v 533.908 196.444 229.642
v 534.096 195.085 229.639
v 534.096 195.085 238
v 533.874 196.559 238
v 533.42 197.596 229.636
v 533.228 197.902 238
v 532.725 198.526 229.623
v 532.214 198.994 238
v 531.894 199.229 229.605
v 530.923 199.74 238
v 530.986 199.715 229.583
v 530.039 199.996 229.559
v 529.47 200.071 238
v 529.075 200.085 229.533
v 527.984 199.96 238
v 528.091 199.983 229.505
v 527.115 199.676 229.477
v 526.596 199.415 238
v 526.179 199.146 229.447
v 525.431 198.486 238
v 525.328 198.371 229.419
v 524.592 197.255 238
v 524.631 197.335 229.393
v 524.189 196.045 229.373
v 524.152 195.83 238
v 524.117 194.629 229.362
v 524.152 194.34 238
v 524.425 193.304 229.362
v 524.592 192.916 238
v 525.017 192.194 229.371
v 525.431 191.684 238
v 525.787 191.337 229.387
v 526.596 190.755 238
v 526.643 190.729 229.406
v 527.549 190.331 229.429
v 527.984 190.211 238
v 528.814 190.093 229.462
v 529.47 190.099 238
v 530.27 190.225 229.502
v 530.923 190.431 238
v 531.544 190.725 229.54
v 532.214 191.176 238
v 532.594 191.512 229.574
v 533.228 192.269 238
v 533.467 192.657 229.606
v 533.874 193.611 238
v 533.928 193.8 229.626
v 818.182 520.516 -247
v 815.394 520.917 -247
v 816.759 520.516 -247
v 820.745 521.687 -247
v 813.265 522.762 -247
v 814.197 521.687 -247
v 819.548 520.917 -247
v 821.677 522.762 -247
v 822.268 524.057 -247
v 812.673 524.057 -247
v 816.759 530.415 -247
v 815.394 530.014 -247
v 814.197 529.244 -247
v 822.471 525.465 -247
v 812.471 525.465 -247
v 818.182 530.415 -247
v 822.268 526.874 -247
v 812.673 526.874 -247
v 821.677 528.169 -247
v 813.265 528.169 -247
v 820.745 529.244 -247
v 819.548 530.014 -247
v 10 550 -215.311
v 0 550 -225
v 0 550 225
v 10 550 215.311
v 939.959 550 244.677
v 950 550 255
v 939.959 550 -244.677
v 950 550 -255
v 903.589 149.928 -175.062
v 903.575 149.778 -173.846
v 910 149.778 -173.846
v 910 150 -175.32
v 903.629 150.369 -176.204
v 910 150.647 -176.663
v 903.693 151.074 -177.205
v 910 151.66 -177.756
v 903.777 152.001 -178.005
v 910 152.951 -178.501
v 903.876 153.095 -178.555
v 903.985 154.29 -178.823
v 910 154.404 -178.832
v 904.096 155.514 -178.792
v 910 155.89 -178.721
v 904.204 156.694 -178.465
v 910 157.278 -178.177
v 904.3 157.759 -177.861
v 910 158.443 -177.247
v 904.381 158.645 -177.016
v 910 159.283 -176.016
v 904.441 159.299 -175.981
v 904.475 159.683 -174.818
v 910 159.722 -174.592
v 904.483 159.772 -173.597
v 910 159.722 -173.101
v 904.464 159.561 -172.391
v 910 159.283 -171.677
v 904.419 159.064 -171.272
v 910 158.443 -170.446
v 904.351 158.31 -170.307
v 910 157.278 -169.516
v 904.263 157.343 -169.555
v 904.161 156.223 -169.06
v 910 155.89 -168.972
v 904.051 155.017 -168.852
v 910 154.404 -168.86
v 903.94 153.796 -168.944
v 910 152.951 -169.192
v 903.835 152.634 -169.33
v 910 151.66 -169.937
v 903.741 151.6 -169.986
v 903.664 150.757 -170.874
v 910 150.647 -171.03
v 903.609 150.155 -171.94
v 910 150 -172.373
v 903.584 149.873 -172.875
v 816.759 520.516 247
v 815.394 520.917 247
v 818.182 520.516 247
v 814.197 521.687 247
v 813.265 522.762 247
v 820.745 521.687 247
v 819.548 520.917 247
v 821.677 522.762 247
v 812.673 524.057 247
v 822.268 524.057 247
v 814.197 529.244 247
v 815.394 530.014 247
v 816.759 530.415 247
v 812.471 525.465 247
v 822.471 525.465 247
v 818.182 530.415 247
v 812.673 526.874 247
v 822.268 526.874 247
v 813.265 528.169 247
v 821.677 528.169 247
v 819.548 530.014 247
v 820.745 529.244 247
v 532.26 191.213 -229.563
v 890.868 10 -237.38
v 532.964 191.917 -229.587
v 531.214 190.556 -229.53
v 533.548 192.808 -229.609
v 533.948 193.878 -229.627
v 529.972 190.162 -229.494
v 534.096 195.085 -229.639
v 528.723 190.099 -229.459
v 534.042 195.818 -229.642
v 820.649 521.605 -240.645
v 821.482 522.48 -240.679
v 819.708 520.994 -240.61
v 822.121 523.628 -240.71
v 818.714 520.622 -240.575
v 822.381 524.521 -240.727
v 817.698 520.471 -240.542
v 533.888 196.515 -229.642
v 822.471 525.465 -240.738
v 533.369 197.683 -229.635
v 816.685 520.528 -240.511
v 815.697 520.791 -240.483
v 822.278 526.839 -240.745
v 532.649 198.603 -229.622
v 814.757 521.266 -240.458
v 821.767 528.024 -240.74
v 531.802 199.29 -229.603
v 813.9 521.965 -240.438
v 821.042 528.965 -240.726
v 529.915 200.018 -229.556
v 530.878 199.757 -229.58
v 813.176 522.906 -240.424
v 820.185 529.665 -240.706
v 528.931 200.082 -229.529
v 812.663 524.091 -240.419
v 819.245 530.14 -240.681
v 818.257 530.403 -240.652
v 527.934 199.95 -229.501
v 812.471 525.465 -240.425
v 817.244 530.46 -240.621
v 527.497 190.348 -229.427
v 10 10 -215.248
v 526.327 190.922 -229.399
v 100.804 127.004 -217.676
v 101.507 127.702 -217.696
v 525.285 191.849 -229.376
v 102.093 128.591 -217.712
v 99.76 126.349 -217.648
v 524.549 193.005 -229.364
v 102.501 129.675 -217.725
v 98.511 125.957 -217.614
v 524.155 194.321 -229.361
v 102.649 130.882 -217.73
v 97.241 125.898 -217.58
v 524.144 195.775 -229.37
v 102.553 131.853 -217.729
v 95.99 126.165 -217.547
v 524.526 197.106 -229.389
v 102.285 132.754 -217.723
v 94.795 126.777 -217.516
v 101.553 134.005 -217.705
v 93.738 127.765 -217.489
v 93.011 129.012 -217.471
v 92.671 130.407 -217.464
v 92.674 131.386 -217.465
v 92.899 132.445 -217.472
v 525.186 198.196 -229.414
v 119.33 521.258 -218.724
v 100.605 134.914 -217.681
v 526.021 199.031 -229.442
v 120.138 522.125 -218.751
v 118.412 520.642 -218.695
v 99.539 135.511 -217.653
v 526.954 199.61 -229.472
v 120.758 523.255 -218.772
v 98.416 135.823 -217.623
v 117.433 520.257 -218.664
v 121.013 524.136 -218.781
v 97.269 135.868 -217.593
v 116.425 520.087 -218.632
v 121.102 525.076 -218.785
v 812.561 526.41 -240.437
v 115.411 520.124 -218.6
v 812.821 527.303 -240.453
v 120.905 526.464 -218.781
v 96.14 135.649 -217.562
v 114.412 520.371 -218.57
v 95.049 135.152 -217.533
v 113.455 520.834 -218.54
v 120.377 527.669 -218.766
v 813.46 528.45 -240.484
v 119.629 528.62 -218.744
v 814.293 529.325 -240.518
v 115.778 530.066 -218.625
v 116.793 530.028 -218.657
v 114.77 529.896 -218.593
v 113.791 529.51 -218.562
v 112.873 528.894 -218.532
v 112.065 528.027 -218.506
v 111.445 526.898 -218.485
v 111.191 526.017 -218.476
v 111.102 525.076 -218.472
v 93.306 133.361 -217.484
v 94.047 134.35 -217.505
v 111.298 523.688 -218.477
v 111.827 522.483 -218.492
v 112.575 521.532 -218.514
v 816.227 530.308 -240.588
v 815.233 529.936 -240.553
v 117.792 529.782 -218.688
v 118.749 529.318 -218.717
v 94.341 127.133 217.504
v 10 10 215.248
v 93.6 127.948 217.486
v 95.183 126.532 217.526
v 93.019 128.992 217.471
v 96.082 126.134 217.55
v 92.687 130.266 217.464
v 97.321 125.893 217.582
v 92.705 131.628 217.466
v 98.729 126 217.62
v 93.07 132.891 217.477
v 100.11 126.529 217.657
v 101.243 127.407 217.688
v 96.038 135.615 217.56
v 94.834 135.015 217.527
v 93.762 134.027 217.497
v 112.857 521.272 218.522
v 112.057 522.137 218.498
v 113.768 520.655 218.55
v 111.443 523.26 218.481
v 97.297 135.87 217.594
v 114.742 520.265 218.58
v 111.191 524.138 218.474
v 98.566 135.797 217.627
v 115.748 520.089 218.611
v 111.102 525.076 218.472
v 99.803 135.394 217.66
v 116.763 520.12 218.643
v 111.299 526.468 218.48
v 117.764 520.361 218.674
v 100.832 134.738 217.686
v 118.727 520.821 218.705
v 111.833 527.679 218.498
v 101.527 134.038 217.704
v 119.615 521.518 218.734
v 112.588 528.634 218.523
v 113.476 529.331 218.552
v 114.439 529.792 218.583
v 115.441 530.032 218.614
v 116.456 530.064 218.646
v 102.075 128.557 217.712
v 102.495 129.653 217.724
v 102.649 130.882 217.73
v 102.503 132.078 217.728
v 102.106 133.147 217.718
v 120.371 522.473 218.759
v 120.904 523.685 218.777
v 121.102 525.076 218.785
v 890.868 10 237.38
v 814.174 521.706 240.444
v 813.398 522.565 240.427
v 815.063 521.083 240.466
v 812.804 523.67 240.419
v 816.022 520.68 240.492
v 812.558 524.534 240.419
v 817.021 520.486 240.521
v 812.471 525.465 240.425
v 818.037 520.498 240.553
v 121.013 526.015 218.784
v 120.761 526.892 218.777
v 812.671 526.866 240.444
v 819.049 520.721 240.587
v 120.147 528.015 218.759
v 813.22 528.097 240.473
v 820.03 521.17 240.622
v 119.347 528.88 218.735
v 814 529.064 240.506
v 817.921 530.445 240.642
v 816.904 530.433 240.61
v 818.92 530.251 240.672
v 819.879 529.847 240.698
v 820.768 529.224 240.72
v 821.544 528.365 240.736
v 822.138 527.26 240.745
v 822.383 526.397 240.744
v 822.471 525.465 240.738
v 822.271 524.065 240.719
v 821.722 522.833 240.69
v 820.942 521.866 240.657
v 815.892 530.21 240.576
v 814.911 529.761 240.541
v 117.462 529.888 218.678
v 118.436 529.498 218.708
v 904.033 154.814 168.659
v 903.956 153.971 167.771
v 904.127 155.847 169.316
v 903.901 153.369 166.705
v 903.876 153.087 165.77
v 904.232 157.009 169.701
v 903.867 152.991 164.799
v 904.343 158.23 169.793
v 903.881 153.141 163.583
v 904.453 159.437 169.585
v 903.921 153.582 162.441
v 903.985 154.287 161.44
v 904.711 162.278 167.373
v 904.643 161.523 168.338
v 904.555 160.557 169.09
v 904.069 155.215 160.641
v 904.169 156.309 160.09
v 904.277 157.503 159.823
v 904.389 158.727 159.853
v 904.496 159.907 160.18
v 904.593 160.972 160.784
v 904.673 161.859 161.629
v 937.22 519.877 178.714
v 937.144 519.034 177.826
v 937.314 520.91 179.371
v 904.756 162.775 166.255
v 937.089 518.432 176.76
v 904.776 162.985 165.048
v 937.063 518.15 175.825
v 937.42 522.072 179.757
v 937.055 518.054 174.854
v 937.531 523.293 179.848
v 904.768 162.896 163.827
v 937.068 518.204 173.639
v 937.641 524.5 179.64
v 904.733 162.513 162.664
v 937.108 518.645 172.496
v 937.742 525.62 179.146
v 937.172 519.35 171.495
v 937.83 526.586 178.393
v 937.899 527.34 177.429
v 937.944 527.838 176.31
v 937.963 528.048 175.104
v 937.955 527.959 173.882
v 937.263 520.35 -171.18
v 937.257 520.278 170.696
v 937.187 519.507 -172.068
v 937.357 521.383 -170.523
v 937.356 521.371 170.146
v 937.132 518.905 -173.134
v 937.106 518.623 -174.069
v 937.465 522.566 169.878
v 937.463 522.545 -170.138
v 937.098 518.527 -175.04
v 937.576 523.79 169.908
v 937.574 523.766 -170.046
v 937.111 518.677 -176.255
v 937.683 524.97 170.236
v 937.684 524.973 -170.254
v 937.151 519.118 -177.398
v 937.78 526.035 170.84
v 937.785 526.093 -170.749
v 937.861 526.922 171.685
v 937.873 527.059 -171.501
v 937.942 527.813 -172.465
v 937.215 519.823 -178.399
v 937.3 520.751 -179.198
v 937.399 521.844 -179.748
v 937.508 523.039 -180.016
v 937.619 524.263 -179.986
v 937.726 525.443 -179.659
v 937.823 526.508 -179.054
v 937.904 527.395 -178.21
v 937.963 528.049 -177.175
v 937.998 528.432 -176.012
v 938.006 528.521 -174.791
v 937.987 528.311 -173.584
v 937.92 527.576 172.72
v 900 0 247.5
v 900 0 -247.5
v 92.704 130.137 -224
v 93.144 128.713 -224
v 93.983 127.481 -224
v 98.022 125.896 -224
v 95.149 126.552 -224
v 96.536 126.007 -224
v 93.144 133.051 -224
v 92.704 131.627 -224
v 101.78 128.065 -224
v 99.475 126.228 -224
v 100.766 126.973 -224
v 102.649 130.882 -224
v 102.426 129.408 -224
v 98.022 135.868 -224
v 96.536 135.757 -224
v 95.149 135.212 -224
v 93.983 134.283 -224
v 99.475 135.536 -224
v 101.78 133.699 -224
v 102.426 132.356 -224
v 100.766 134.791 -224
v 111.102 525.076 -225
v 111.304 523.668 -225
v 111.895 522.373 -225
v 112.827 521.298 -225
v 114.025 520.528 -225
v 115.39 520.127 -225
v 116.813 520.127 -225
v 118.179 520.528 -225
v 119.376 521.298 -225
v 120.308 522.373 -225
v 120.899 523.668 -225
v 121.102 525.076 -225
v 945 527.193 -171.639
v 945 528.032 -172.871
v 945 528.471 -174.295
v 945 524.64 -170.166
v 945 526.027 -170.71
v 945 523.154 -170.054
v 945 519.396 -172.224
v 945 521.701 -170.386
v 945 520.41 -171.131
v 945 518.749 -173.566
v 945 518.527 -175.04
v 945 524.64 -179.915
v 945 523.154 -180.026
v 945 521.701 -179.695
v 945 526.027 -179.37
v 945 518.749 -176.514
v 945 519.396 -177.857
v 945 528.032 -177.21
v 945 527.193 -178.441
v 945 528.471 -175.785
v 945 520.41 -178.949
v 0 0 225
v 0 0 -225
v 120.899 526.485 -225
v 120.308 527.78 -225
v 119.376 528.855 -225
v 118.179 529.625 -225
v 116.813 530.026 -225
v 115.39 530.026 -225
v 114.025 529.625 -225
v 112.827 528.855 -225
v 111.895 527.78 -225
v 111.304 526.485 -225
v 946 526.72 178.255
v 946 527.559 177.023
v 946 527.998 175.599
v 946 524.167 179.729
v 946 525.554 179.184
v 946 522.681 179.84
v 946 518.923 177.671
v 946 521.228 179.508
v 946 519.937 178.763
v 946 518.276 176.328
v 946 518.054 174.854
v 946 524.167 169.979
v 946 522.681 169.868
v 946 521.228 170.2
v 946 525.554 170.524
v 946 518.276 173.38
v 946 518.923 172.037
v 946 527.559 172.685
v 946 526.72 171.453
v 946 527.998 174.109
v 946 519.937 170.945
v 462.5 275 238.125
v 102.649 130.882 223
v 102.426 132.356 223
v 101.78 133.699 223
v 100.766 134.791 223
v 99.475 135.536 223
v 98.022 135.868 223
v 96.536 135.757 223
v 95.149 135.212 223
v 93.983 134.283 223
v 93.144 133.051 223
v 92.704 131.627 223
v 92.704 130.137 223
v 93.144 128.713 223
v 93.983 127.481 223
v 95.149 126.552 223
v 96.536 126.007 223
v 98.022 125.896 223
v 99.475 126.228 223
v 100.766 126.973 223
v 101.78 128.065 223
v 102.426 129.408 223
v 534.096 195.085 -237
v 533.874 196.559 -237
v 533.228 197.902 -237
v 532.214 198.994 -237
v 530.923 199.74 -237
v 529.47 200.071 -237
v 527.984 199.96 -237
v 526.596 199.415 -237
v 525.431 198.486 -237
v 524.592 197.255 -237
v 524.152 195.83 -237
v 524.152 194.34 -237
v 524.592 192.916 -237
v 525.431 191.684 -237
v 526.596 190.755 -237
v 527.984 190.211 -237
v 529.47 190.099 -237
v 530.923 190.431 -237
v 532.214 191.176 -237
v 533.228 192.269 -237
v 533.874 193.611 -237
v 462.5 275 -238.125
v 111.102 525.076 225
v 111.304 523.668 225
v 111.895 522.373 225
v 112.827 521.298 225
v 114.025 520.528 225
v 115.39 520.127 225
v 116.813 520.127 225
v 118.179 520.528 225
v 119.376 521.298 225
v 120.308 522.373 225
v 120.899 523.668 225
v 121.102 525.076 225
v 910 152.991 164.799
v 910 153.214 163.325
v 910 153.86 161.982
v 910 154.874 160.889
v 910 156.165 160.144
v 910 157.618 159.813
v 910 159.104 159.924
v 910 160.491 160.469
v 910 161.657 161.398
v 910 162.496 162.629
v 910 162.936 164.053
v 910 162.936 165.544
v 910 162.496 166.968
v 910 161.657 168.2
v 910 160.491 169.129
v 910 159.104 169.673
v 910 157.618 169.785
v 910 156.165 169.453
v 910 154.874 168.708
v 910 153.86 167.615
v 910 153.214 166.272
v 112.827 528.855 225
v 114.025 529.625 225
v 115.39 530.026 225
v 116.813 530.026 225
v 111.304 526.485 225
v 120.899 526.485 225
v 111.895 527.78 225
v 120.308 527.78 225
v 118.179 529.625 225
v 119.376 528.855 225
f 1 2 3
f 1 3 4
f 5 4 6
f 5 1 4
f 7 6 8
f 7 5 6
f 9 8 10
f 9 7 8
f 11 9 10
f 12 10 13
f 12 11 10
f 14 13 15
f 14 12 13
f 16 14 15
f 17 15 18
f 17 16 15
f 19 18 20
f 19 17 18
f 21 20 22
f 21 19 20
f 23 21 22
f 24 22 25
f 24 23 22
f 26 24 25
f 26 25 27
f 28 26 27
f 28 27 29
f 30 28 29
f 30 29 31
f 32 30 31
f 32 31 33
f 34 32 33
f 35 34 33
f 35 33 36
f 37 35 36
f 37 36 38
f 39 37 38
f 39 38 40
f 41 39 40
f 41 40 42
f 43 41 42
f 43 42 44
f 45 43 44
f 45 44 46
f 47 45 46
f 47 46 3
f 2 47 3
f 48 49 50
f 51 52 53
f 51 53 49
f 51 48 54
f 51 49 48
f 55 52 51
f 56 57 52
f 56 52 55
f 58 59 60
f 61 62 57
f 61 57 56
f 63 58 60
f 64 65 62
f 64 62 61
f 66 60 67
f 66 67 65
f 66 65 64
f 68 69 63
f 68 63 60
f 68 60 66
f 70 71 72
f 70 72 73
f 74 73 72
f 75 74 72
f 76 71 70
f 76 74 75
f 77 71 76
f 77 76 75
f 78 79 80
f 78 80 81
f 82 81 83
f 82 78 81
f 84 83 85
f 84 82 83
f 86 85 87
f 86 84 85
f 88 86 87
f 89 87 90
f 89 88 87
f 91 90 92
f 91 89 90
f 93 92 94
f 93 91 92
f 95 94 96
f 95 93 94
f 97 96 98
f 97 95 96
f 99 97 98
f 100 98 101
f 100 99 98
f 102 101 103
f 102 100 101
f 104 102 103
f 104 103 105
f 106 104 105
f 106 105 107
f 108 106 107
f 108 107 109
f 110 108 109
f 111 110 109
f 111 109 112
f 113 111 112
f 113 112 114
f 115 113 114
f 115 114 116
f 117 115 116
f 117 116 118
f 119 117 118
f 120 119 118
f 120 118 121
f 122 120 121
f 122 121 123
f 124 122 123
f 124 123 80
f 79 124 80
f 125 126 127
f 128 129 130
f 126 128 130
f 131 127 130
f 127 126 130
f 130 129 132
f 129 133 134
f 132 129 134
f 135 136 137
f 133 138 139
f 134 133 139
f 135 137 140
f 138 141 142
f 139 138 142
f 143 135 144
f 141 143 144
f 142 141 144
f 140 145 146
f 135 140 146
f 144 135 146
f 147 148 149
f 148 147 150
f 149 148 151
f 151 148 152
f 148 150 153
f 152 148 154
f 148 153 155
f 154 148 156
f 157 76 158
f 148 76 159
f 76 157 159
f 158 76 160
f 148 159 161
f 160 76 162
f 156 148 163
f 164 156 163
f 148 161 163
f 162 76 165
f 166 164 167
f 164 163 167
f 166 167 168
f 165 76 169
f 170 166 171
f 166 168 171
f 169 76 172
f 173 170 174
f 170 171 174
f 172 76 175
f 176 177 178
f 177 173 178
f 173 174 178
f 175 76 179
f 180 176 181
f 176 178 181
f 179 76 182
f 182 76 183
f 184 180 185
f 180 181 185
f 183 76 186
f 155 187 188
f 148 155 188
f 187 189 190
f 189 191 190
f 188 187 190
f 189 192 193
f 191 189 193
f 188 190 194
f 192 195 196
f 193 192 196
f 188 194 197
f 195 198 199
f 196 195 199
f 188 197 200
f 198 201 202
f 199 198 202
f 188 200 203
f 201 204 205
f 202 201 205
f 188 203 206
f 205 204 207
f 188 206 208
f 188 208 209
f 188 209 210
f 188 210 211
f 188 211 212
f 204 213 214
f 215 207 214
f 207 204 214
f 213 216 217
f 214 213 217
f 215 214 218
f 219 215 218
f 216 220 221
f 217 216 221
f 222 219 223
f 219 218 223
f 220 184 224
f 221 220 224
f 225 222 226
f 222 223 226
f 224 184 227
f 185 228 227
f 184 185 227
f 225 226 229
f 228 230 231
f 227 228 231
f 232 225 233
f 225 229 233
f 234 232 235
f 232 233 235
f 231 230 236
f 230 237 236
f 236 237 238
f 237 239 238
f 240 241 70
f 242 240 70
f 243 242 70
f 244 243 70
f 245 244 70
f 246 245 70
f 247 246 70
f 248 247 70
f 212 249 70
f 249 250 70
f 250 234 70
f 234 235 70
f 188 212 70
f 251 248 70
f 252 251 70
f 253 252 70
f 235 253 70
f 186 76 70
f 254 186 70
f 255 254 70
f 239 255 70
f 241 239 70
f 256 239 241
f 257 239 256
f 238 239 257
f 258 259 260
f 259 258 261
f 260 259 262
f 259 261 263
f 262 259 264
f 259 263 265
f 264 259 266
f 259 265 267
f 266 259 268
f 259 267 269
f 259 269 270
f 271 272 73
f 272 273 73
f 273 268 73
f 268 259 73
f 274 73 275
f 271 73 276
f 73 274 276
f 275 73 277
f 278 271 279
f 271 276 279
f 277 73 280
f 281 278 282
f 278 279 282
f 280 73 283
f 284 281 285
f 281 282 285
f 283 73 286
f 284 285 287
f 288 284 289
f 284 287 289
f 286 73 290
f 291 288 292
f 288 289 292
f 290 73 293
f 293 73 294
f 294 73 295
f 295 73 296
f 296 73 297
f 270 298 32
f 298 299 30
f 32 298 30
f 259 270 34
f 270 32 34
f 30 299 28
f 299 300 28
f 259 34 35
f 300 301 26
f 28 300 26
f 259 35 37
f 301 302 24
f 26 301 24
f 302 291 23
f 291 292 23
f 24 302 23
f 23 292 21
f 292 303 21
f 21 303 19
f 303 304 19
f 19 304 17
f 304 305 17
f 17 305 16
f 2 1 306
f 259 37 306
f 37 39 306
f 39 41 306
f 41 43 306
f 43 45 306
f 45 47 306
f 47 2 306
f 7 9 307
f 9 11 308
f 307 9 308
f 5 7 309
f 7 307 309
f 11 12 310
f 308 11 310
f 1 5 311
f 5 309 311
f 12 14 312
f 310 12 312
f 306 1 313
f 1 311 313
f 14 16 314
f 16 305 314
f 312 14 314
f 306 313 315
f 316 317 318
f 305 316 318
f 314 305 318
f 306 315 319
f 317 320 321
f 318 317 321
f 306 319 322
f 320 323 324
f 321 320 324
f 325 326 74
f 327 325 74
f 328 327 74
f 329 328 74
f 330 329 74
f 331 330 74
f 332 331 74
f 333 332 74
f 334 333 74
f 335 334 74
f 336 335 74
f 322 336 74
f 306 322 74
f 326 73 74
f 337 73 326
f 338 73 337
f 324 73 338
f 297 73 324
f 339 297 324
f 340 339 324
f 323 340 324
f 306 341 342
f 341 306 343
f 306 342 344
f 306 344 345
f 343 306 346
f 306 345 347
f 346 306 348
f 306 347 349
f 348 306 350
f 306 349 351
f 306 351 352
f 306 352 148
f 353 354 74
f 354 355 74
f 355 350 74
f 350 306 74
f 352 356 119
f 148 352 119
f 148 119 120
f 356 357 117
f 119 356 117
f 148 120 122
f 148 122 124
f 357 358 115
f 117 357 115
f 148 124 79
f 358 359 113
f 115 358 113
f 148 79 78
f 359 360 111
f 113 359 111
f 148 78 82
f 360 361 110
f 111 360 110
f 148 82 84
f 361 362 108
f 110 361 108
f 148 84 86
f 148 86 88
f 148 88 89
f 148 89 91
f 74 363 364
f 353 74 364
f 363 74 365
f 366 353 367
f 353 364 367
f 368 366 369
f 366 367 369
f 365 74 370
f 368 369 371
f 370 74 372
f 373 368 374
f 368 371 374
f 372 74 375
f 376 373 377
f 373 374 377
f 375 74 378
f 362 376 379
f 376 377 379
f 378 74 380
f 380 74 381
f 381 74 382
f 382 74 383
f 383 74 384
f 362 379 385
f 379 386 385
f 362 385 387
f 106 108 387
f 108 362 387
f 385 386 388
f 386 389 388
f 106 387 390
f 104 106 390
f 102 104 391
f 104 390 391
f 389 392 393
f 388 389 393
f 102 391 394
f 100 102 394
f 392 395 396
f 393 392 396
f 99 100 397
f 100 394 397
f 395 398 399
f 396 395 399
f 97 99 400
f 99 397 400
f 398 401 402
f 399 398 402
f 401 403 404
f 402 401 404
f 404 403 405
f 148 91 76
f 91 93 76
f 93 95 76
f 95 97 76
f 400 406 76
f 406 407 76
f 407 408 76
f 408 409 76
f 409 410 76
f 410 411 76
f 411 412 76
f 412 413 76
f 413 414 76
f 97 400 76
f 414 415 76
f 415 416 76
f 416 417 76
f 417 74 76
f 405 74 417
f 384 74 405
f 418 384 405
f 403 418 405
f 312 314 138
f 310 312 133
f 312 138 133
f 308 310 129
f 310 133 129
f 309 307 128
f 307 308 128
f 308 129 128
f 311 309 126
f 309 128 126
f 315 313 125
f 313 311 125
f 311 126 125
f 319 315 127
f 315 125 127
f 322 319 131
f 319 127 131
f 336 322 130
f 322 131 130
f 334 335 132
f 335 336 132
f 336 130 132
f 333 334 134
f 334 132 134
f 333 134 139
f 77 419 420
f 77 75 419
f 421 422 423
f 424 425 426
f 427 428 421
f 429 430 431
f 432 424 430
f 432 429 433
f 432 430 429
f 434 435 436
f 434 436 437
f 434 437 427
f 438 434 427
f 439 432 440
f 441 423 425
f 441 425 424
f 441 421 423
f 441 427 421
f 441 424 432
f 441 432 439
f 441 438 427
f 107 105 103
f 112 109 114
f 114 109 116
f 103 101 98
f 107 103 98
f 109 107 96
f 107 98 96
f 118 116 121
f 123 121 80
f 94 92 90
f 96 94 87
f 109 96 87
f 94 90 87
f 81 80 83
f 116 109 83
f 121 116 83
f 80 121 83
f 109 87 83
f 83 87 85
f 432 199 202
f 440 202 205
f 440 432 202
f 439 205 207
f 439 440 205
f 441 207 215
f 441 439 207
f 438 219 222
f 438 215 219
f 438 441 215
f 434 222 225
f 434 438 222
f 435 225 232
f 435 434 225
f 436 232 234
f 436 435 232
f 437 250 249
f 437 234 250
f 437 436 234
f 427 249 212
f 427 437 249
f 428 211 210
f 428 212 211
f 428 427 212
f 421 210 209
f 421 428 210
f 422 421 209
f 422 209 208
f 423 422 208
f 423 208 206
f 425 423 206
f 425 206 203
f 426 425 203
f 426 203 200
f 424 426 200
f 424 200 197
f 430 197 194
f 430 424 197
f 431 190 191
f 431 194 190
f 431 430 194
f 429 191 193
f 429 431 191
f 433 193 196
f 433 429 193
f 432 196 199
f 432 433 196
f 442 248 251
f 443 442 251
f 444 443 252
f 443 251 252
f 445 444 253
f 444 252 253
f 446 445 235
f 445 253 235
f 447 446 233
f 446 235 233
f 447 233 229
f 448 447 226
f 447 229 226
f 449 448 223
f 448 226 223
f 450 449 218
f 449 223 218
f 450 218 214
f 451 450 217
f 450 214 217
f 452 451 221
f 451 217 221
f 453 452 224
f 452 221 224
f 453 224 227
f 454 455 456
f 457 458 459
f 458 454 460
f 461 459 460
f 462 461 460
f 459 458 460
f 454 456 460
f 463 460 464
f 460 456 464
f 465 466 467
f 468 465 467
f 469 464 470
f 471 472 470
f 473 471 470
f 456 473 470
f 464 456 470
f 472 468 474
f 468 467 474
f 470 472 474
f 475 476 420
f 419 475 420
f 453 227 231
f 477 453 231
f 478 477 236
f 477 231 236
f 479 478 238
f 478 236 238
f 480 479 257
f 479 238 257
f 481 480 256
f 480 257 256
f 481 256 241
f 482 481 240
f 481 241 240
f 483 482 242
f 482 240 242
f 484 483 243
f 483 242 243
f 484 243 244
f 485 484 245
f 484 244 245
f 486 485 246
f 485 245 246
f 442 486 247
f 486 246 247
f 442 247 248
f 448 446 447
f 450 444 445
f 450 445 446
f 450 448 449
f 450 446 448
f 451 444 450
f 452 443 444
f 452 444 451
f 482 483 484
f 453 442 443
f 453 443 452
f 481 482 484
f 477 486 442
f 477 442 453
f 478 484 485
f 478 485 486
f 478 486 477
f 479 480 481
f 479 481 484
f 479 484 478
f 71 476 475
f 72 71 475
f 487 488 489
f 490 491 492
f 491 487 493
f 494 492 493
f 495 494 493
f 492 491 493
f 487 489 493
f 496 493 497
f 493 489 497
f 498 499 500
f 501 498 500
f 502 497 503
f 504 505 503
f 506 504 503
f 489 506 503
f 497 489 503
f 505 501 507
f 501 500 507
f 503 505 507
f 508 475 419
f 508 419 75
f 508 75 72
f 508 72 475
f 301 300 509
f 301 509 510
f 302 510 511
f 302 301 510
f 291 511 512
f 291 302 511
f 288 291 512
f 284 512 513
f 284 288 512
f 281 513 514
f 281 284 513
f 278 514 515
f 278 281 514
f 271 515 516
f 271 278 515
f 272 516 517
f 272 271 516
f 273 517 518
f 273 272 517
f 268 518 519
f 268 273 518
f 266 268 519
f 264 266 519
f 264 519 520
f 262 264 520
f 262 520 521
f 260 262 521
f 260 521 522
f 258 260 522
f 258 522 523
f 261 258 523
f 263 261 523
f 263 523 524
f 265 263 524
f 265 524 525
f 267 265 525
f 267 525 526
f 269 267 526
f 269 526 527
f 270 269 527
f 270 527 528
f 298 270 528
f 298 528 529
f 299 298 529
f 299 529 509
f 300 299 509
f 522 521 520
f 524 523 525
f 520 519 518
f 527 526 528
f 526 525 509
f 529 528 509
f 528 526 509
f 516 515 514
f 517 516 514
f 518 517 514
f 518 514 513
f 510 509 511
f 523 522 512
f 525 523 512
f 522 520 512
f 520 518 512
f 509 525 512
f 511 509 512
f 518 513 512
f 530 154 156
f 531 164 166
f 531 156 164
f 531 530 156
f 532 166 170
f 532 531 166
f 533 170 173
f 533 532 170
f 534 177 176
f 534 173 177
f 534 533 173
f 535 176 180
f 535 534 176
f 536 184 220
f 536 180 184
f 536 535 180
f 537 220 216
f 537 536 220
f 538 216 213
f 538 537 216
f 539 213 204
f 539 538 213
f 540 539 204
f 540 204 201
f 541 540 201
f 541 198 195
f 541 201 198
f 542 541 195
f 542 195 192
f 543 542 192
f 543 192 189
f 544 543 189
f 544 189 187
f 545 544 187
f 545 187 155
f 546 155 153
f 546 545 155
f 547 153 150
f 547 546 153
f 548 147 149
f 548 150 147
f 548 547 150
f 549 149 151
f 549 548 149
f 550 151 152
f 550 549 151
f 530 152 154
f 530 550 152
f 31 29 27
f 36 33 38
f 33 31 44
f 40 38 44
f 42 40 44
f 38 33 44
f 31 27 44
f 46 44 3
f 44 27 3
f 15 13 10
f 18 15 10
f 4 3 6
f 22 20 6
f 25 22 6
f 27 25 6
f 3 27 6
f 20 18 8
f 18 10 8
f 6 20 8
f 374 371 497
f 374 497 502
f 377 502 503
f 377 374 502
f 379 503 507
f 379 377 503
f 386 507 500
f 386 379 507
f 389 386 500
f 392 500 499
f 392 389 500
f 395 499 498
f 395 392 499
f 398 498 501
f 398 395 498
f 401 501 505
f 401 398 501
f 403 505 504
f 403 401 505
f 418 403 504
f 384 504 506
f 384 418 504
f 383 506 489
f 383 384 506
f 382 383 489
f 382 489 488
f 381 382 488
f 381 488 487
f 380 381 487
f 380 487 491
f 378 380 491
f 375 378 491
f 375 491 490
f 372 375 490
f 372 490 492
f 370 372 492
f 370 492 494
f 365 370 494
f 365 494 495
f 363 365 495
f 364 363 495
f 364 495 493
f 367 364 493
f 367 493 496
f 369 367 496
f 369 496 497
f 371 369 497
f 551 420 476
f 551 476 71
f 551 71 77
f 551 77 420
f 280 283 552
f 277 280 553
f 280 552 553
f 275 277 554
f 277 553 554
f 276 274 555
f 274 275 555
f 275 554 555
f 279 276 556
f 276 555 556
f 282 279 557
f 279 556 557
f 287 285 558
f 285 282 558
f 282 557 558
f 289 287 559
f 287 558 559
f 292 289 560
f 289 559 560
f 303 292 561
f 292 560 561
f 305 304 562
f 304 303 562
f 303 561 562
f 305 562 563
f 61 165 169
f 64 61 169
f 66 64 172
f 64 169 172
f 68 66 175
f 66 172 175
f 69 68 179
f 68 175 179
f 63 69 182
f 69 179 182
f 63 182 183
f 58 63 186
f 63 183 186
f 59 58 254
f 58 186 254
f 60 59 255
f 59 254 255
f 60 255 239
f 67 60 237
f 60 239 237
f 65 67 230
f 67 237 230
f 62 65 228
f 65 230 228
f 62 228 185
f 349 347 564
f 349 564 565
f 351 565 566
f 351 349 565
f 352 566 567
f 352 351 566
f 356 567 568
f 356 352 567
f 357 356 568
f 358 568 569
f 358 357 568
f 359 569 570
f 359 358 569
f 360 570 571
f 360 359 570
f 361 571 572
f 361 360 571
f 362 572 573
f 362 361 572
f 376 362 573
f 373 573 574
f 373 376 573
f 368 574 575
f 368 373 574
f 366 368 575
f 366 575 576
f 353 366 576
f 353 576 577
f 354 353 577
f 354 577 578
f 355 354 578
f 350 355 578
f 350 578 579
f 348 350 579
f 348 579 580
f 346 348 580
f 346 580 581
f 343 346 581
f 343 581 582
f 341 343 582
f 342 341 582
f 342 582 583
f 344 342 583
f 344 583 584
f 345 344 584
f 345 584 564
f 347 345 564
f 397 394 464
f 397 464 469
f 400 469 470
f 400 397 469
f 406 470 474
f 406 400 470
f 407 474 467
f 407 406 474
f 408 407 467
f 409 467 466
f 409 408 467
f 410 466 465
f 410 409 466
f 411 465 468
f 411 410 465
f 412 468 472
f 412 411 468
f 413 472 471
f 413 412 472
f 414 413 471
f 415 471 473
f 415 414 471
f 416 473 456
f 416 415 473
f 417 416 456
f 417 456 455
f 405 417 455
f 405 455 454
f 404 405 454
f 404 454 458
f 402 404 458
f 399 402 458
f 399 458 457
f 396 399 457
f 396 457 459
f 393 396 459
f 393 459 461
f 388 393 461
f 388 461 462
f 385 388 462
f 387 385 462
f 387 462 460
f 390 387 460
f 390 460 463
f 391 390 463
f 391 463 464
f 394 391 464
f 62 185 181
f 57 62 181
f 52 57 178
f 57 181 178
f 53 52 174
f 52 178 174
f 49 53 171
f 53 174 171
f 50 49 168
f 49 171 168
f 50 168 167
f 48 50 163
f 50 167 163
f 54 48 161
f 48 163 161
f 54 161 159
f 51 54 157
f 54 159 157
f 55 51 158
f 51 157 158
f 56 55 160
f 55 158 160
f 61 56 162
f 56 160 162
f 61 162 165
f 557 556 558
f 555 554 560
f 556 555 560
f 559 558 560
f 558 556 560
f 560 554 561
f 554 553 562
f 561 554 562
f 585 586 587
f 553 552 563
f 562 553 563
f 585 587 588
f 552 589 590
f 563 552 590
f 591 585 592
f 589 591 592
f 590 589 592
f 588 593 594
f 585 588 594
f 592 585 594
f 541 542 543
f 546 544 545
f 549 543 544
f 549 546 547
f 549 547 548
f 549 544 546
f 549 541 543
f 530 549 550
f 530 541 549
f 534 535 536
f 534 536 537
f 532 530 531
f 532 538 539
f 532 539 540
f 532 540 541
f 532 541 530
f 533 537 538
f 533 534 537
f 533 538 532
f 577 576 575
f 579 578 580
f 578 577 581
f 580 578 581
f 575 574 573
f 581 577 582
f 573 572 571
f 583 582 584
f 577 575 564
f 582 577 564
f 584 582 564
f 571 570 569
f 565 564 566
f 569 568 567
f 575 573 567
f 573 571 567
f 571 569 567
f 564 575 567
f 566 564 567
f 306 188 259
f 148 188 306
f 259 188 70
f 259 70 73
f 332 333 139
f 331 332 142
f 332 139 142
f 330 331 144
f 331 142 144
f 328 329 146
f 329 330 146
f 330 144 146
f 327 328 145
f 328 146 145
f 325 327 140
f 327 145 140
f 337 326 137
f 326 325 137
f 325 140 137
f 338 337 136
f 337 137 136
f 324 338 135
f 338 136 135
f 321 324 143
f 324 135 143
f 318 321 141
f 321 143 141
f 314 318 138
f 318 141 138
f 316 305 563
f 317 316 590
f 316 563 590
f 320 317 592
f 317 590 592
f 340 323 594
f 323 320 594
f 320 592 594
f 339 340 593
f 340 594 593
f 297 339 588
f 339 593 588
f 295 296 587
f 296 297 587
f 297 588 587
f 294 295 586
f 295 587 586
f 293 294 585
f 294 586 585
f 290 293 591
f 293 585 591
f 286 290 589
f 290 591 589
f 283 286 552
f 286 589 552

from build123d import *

# Parameters (mm, degrees)
CASCA4_T                = -10
CUT_EXTRUDE3_DEPTH      = 23
CUT_EXTRUDE3_DEPTH_BACK = 452
SKETCH3_R               = 5
CUT_EXTRUDE4_DEPTH      = 8
CUT_EXTRUDE4_DEPTH_BACK = 439
SKETCH4_R               = 5
SKETCH5_R               = 5
CUT_EXTRUDE5_DEPTH      = 55
SKETCH6_R               = 5
CUT_EXTRUDE6_DEPTH      = 56
SKETCH8_R               = 5
CUT_EXTRUDE7_DEPTH      = 20
SKETCH9_R               = 5
CUT_EXTRUDE8_DEPTH      = 20


with BuildPart() as part:
    # Esboço1 → Loft3 section 0
    with BuildSketch(Plane(origin=(0, 0, 0), x_dir=(1, 0, 0), z_dir=(0, 1, 0))):
        with BuildLine():
            Line((0, 225), (0, -225))
            Line((0, -225), (900, -247.5))
            Line((900, -247.5), (900, 247.5))
            Line((900, 247.5), (0, 225))
        make_face()
    # Esboço2 → Loft3 section 1
    with BuildSketch(Plane(origin=(0, 550, 0), x_dir=(1, 0, 0), z_dir=(0, 1, 0))):
        with BuildLine():
            Line((0, 225), (0, -225))
            Line((0, -225), (950, -255))
            Line((950, -255), (950, 255))
            Line((950, 255), (0, 225))
        make_face()
    loft()

    # Casca4
    casca4_openings = [part.faces().sort_by_distance(p)[0] for p in [
        (484.895833333, 550, 0),
    ]]
    offset(amount=CASCA4_T, openings=casca4_openings, kind=Kind.INTERSECTION)

    # Cut-Extrude1: read off the stored shape, not the designer's step
    # Cut-Extrude1: loft between two sections, ruled curve by curve
    cut_extrude1_from = [
        Edge.make_three_point_arc((121.101758385, 525.076407947, -225), (116.101758385, 530.076407947, -225), (111.101758385, 525.076407947, -225)),
        Edge.make_three_point_arc((111.101758385, 525.076407947, -225), (116.101758385, 520.076407947, -225), (121.101758385, 525.076407947, -225)),
    ]
    cut_extrude1_to = [
        Edge.make_three_point_arc((121.101758385, 525.076407947, -218.471984374), (116.101758385, 530.076407947, -218.471984374), (111.101758385, 525.076407947, -218.471984374)),
        Edge.make_three_point_arc((111.101758385, 525.076407947, -218.471984374), (116.101758385, 520.076407947, -218.471984374), (121.101758385, 525.076407947, -218.471984374)),
    ]
    cut_extrude1 = Solid(Shell([*[Face.make_surface_from_curves(cut_extrude1_from[k], cut_extrude1_to[k]) for k in range(2)], Face(Wire(cut_extrude1_from)), Face(Wire(cut_extrude1_to))]))
    add(cut_extrude1, mode=Mode.SUBTRACT)

    # Cut-Extrude1 2: loft between two sections, ruled curve by curve
    cut_extrude1_2_from = [
        Edge.make_three_point_arc((121.101758385, 525.076407947, 218.471984384), (116.101758385, 530.076407947, 218.471984384), (111.101758385, 525.076407947, 218.471984384)),
        Edge.make_three_point_arc((111.101758385, 525.076407947, 218.471984384), (116.101758385, 520.076407947, 218.471984384), (121.101758385, 525.076407947, 218.471984384)),
    ]
    cut_extrude1_2_to = [
        Edge.make_three_point_arc((121.101758385, 525.076407947, 225), (116.101758385, 530.076407947, 225), (111.101758385, 525.076407947, 225)),
        Edge.make_three_point_arc((111.101758385, 525.076407947, 225), (116.101758385, 520.076407947, 225), (121.101758385, 525.076407947, 225)),
    ]
    cut_extrude1_2 = Solid(Shell([*[Face.make_surface_from_curves(cut_extrude1_2_from[k], cut_extrude1_2_to[k]) for k in range(2)], Face(Wire(cut_extrude1_2_from)), Face(Wire(cut_extrude1_2_to))]))
    add(cut_extrude1_2, mode=Mode.SUBTRACT)

    # Cut-Extrude2: read off the stored shape, not the designer's step
    # Cut-Extrude2: loft between two sections, ruled curve by curve
    cut_extrude2_from = [
        Edge.make_three_point_arc((822.470918457, 525.465412678, -247), (817.470918457, 530.465412678, -247), (812.470918457, 525.465412678, -247)),
        Edge.make_three_point_arc((812.470918457, 525.465412678, -247), (817.470918457, 520.465412678, -247), (822.470918457, 525.465412678, -247)),
    ]
    cut_extrude2_to = [
        Edge.make_three_point_arc((822.470918457, 525.465412678, -240.418518829), (817.470918457, 530.465412678, -240.418518829), (812.470918457, 525.465412678, -240.418518829)),
        Edge.make_three_point_arc((812.470918457, 525.465412678, -240.418518829), (817.470918457, 520.465412678, -240.418518829), (822.470918457, 525.465412678, -240.418518829)),
    ]
    cut_extrude2 = Solid(Shell([*[Face.make_surface_from_curves(cut_extrude2_from[k], cut_extrude2_to[k]) for k in range(2)], Face(Wire(cut_extrude2_from)), Face(Wire(cut_extrude2_to))]))
    add(cut_extrude2, mode=Mode.SUBTRACT)

    # Cut-Extrude2 2: loft between two sections, ruled curve by curve
    cut_extrude2_2_from = [
        Edge.make_three_point_arc((822.470918457, 525.465412678, 240.418519067), (817.470918457, 530.465412678, 240.418519067), (812.470918457, 525.465412678, 240.418519067)),
        Edge.make_three_point_arc((812.470918457, 525.465412678, 240.418519067), (817.470918457, 520.465412678, 240.418519067), (822.470918457, 525.465412678, 240.418519067)),
    ]
    cut_extrude2_2_to = [
        Edge.make_three_point_arc((822.470918457, 525.465412678, 247), (817.470918457, 530.465412678, 247), (812.470918457, 525.465412678, 247)),
        Edge.make_three_point_arc((812.470918457, 525.465412678, 247), (817.470918457, 520.465412678, 247), (822.470918457, 525.465412678, 247)),
    ]
    cut_extrude2_2 = Solid(Shell([*[Face.make_surface_from_curves(cut_extrude2_2_from[k], cut_extrude2_2_to[k]) for k in range(2)], Face(Wire(cut_extrude2_2_from)), Face(Wire(cut_extrude2_2_to))]))
    add(cut_extrude2_2, mode=Mode.SUBTRACT)

    # Sketch3 → Cut-Extrude3 (cut, two sides: drawn at the far end of the back side and taken through both)
    with BuildSketch(Plane.XY.offset(215).offset(-CUT_EXTRUDE3_DEPTH_BACK)):
        with Locations((529.096415143, 195.085241143)):
            Circle(SKETCH3_R)
    extrude(amount=CUT_EXTRUDE3_DEPTH + CUT_EXTRUDE3_DEPTH_BACK, mode=Mode.SUBTRACT)

    # Sketch4 → Cut-Extrude4 (cut, two sides: drawn at the far end of the back side and taken through both)
    with BuildSketch(Plane.XY.offset(215).offset(-CUT_EXTRUDE4_DEPTH_BACK)):
        with Locations((97.648591279, 130.881920188)):
            Circle(SKETCH4_R)
    extrude(amount=CUT_EXTRUDE4_DEPTH + CUT_EXTRUDE4_DEPTH_BACK, mode=Mode.SUBTRACT)

    # Sketch5 → Cut-Extrude5 (cut)
    with BuildSketch(Plane(origin=(890, 0, 0), x_dir=(0, 0, -1), z_dir=(1, 0, 0))):
        with Locations(Location((175.040186522, 523.527338852, 0), (0, 0, 270))):
            Circle(SKETCH5_R)
    extrude(amount=CUT_EXTRUDE5_DEPTH, mode=Mode.SUBTRACT)

    # Sketch6 → Cut-Extrude6 (cut)
    with BuildSketch(Plane(origin=(890, 0, 0), x_dir=(0, 0, -1), z_dir=(1, 0, 0))):
        with Locations(Location((-174.853977213, 523.054329593, 0), (0, 0, 270))):
            Circle(SKETCH6_R)
    extrude(amount=CUT_EXTRUDE6_DEPTH, mode=Mode.SUBTRACT)

    # Sketch8 → Cut-Extrude7 (cut)
    with BuildSketch(Plane(origin=(890, 0, 0), x_dir=(0, 0, -1), z_dir=(1, 0, 0))):
        with Locations(Location((173.846443874, 154.777832346, 0), (0, 0, 270))):
            Circle(SKETCH8_R)
    extrude(amount=CUT_EXTRUDE7_DEPTH, mode=Mode.SUBTRACT)

    # Sketch9 → Cut-Extrude8 (cut)
    with BuildSketch(Plane(origin=(890, 0, 0), x_dir=(0, 0, -1), z_dir=(1, 0, 0))):
        with Locations(Location((-164.798644624, 157.991483325, 0), (0, 0, 270))):
            Circle(SKETCH9_R)
    extrude(amount=CUT_EXTRUDE8_DEPTH, mode=Mode.SUBTRACT)


solid = part.part
